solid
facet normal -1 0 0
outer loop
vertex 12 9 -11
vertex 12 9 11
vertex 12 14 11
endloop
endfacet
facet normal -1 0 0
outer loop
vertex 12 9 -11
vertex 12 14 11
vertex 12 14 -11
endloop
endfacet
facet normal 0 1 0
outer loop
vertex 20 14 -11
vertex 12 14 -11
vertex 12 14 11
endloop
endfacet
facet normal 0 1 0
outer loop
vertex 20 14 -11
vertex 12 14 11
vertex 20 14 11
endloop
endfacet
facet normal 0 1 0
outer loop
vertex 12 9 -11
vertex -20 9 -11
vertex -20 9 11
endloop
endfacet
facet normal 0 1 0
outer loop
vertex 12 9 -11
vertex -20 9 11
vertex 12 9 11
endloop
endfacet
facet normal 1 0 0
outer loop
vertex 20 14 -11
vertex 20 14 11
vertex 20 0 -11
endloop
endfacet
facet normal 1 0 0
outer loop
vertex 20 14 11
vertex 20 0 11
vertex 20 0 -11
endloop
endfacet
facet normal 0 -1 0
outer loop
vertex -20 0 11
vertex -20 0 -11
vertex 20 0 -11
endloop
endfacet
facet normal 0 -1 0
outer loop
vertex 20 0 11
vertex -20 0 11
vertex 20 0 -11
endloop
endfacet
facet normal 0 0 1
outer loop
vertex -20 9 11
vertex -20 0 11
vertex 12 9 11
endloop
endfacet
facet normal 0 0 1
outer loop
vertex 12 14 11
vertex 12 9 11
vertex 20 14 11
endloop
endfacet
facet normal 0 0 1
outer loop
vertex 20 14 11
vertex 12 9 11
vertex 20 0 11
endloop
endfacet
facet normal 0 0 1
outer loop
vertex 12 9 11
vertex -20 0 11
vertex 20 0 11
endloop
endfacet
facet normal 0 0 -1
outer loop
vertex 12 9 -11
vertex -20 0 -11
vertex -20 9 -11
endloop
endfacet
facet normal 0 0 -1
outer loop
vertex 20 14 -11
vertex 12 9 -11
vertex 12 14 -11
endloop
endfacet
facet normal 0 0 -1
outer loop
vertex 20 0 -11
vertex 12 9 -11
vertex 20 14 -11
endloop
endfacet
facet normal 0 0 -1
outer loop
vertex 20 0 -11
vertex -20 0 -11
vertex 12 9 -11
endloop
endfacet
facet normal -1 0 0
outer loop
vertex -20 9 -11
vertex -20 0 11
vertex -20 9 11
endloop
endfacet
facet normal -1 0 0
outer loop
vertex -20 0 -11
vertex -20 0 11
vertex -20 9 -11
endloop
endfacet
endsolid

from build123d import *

# Parameters (mm, degrees)
SKETCH_1_W      = 40
SKETCH_1_H      = 22
EXTRUDE_1_DEPTH = 9
SKETCH_2_W      = 8
SKETCH_2_H      = 22
EXTRUDE_2_DEPTH = 5


with BuildPart() as part:
    # Эскиз1 → Бобышка-Вытянуть1 (new body)
    with BuildSketch(Plane(origin=(0, 0, 0), x_dir=(1, 0, 0), z_dir=(0, 1, 0))):
        Rectangle(SKETCH_1_W, SKETCH_1_H)
    extrude(amount=EXTRUDE_1_DEPTH)

    # Эскиз2 → Бобышка-Вытянуть2 (add)
    with BuildSketch(Plane(origin=(0, 9, 0), x_dir=(1, 0, 0), z_dir=(0, 1, 0))):
        with Locations((16, 0)):
            Rectangle(SKETCH_2_W, SKETCH_2_H)
    extrude(amount=EXTRUDE_2_DEPTH)


solid = part.part
